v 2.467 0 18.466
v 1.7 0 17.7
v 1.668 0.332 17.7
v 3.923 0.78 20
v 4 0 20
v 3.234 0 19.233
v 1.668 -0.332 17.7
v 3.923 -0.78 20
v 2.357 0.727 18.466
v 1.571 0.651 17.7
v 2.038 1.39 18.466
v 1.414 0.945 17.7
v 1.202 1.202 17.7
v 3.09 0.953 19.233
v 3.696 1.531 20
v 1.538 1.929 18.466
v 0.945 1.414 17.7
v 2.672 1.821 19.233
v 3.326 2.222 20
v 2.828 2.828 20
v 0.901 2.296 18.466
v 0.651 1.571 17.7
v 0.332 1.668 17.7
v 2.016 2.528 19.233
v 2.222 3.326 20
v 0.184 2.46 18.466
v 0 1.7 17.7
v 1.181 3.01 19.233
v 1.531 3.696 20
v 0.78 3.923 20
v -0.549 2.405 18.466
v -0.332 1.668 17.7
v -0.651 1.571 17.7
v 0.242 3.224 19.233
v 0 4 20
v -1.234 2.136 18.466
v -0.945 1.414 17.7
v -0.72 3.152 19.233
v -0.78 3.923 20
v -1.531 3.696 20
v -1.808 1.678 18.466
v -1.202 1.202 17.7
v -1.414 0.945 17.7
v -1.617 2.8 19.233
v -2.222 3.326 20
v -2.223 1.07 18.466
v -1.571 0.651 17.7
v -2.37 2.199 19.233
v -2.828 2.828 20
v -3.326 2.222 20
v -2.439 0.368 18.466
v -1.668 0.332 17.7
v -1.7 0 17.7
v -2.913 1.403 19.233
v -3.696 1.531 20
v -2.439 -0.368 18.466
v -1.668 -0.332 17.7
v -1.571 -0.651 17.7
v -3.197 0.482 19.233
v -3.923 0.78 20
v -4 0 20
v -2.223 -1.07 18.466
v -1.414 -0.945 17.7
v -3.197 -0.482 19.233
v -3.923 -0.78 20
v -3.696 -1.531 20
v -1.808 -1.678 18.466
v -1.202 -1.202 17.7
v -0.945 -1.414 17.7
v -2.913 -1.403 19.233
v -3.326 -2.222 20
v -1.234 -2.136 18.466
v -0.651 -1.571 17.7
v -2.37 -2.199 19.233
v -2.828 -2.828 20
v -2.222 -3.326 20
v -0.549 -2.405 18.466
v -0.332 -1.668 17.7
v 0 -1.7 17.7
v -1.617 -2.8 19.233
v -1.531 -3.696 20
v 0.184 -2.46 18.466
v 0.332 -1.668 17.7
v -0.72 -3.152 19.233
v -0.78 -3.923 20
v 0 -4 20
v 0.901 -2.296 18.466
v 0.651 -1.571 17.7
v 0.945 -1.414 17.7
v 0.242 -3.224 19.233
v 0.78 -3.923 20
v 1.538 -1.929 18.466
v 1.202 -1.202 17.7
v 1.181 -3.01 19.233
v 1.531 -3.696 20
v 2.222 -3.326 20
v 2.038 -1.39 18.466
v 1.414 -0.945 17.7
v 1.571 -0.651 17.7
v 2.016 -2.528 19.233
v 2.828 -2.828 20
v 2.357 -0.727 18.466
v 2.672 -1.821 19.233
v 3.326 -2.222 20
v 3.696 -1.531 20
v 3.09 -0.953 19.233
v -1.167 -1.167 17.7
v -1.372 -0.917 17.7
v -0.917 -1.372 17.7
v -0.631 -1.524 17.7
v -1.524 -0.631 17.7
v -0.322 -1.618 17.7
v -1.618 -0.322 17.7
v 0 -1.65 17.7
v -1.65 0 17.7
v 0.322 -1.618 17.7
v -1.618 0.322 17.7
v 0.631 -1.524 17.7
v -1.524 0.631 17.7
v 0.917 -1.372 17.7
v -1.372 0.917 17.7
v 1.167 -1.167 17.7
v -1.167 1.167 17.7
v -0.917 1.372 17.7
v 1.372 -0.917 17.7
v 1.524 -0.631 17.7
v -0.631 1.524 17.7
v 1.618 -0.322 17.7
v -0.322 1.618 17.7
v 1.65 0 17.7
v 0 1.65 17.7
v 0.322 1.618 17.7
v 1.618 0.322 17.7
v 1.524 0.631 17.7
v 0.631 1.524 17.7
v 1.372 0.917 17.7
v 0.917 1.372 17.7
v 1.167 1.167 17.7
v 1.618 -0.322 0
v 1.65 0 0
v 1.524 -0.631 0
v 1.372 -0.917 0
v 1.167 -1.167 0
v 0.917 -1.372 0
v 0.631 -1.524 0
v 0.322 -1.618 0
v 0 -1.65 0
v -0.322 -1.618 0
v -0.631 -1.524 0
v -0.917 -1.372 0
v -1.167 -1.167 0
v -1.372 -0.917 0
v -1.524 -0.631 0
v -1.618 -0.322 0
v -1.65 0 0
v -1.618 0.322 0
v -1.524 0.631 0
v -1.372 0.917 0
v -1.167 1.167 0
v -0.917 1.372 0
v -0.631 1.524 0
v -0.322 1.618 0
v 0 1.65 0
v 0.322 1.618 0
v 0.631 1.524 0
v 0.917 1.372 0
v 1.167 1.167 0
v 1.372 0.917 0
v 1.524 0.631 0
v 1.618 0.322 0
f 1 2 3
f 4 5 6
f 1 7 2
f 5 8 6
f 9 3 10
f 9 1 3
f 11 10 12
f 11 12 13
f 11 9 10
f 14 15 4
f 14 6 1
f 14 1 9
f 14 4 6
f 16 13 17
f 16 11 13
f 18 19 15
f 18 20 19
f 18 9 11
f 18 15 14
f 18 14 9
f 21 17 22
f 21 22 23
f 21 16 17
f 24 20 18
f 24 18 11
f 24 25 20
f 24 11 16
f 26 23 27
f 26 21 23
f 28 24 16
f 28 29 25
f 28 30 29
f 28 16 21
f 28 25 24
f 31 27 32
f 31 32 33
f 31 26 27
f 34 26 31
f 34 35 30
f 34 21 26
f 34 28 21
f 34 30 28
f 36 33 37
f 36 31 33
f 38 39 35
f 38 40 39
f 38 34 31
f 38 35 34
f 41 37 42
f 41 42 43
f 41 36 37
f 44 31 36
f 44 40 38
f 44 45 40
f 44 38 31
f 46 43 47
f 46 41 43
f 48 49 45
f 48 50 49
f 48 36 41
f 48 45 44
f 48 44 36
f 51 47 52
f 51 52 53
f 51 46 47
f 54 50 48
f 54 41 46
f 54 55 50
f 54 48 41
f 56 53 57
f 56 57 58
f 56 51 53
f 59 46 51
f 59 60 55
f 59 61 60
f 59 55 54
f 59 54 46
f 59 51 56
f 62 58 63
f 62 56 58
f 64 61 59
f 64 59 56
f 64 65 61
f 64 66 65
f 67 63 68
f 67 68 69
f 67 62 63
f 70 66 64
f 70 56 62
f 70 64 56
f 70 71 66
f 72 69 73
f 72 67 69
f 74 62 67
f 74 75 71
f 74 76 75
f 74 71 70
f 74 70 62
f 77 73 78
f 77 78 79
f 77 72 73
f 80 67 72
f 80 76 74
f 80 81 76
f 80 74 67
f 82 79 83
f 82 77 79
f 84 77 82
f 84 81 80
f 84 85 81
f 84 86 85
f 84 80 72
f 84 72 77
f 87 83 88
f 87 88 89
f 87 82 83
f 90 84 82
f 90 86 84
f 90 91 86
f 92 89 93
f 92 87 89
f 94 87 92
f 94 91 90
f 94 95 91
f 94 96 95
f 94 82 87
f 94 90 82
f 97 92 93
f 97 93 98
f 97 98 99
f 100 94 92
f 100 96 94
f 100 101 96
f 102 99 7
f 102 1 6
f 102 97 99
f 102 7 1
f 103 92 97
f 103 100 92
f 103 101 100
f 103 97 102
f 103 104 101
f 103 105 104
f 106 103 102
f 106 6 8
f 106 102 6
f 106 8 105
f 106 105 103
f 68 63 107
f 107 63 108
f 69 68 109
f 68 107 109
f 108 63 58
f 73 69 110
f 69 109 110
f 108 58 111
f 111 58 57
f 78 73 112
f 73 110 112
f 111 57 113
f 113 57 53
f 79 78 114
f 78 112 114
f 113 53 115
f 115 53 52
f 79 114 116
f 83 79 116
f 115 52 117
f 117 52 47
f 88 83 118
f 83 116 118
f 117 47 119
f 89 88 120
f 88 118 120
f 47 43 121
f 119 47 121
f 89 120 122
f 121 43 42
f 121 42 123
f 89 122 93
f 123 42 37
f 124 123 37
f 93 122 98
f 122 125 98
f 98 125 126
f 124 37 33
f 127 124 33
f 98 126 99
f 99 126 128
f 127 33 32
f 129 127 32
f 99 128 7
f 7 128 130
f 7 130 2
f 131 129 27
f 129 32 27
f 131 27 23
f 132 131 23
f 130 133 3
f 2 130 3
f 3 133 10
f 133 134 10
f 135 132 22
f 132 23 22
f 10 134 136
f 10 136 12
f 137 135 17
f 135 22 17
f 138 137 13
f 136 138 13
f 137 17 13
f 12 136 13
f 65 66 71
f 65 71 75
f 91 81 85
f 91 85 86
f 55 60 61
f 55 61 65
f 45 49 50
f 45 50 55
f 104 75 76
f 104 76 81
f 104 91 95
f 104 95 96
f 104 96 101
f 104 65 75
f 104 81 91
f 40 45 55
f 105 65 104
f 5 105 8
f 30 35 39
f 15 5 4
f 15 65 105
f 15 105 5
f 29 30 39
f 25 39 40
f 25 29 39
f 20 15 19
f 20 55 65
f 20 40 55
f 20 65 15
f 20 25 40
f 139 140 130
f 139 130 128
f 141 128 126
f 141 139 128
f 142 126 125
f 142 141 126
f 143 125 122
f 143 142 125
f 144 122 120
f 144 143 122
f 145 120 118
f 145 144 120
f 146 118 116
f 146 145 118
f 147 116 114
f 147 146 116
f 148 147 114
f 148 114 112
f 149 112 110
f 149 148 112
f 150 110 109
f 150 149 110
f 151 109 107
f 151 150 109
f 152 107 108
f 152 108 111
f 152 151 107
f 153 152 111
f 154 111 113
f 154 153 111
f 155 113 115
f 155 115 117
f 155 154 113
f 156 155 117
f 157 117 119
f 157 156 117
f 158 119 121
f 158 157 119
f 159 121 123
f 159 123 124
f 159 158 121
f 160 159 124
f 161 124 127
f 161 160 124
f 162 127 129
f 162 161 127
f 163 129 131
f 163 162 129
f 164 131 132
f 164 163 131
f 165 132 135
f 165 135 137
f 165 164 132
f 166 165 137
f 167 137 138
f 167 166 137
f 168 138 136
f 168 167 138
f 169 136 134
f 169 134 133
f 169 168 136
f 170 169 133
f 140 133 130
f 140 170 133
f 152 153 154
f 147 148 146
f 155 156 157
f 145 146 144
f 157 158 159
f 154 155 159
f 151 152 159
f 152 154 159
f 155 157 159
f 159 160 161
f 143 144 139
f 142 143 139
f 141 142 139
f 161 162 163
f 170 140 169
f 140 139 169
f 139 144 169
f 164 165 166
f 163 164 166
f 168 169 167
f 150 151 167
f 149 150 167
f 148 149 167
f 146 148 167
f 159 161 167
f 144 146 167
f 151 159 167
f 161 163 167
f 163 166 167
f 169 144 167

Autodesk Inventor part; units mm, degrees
ref_plane "YZ Plane" through (0, 0, 0) normal (1, 0, 0) x (0, 1, 0)
ref_plane "XZ Plane" through (0, 0, 0) normal (0, 1, 0) x (-1, 0, 0)
ref_plane "XY Plane" through (0, 0, 0) normal (0, 0, 1) x (1, 0, 0)
sketch "スケッチ1" plane through (0, 0, 0) normal (0, 0, 1) x (1, 0, 0)
  circle A0 centre (0, 0) radius 1.65
  dimension "d0" = 3.3
extrude "押し出し1" add sketch "スケッチ1" along normal blind 20
sketch "スケッチ2" plane through (0, 0, 20) normal (0, 0, 1) x (1, 0, 0)
  circle A0 centre (0, 0) radius 4
  dimension "d3" = 8
extrude "押し出し2" add sketch "スケッチ2" against normal blind 2.3
chamfer "面取り1" distance 2.3 angle 45 1 edges at (-4, 0, 17.7)
thread "ねじ1" size "M3.5x0.6" class "6g" standard "ANSI Metric M Profile" full length
properties part number "ネジ皿m4,20" material "鋼、高強度、低合金"
